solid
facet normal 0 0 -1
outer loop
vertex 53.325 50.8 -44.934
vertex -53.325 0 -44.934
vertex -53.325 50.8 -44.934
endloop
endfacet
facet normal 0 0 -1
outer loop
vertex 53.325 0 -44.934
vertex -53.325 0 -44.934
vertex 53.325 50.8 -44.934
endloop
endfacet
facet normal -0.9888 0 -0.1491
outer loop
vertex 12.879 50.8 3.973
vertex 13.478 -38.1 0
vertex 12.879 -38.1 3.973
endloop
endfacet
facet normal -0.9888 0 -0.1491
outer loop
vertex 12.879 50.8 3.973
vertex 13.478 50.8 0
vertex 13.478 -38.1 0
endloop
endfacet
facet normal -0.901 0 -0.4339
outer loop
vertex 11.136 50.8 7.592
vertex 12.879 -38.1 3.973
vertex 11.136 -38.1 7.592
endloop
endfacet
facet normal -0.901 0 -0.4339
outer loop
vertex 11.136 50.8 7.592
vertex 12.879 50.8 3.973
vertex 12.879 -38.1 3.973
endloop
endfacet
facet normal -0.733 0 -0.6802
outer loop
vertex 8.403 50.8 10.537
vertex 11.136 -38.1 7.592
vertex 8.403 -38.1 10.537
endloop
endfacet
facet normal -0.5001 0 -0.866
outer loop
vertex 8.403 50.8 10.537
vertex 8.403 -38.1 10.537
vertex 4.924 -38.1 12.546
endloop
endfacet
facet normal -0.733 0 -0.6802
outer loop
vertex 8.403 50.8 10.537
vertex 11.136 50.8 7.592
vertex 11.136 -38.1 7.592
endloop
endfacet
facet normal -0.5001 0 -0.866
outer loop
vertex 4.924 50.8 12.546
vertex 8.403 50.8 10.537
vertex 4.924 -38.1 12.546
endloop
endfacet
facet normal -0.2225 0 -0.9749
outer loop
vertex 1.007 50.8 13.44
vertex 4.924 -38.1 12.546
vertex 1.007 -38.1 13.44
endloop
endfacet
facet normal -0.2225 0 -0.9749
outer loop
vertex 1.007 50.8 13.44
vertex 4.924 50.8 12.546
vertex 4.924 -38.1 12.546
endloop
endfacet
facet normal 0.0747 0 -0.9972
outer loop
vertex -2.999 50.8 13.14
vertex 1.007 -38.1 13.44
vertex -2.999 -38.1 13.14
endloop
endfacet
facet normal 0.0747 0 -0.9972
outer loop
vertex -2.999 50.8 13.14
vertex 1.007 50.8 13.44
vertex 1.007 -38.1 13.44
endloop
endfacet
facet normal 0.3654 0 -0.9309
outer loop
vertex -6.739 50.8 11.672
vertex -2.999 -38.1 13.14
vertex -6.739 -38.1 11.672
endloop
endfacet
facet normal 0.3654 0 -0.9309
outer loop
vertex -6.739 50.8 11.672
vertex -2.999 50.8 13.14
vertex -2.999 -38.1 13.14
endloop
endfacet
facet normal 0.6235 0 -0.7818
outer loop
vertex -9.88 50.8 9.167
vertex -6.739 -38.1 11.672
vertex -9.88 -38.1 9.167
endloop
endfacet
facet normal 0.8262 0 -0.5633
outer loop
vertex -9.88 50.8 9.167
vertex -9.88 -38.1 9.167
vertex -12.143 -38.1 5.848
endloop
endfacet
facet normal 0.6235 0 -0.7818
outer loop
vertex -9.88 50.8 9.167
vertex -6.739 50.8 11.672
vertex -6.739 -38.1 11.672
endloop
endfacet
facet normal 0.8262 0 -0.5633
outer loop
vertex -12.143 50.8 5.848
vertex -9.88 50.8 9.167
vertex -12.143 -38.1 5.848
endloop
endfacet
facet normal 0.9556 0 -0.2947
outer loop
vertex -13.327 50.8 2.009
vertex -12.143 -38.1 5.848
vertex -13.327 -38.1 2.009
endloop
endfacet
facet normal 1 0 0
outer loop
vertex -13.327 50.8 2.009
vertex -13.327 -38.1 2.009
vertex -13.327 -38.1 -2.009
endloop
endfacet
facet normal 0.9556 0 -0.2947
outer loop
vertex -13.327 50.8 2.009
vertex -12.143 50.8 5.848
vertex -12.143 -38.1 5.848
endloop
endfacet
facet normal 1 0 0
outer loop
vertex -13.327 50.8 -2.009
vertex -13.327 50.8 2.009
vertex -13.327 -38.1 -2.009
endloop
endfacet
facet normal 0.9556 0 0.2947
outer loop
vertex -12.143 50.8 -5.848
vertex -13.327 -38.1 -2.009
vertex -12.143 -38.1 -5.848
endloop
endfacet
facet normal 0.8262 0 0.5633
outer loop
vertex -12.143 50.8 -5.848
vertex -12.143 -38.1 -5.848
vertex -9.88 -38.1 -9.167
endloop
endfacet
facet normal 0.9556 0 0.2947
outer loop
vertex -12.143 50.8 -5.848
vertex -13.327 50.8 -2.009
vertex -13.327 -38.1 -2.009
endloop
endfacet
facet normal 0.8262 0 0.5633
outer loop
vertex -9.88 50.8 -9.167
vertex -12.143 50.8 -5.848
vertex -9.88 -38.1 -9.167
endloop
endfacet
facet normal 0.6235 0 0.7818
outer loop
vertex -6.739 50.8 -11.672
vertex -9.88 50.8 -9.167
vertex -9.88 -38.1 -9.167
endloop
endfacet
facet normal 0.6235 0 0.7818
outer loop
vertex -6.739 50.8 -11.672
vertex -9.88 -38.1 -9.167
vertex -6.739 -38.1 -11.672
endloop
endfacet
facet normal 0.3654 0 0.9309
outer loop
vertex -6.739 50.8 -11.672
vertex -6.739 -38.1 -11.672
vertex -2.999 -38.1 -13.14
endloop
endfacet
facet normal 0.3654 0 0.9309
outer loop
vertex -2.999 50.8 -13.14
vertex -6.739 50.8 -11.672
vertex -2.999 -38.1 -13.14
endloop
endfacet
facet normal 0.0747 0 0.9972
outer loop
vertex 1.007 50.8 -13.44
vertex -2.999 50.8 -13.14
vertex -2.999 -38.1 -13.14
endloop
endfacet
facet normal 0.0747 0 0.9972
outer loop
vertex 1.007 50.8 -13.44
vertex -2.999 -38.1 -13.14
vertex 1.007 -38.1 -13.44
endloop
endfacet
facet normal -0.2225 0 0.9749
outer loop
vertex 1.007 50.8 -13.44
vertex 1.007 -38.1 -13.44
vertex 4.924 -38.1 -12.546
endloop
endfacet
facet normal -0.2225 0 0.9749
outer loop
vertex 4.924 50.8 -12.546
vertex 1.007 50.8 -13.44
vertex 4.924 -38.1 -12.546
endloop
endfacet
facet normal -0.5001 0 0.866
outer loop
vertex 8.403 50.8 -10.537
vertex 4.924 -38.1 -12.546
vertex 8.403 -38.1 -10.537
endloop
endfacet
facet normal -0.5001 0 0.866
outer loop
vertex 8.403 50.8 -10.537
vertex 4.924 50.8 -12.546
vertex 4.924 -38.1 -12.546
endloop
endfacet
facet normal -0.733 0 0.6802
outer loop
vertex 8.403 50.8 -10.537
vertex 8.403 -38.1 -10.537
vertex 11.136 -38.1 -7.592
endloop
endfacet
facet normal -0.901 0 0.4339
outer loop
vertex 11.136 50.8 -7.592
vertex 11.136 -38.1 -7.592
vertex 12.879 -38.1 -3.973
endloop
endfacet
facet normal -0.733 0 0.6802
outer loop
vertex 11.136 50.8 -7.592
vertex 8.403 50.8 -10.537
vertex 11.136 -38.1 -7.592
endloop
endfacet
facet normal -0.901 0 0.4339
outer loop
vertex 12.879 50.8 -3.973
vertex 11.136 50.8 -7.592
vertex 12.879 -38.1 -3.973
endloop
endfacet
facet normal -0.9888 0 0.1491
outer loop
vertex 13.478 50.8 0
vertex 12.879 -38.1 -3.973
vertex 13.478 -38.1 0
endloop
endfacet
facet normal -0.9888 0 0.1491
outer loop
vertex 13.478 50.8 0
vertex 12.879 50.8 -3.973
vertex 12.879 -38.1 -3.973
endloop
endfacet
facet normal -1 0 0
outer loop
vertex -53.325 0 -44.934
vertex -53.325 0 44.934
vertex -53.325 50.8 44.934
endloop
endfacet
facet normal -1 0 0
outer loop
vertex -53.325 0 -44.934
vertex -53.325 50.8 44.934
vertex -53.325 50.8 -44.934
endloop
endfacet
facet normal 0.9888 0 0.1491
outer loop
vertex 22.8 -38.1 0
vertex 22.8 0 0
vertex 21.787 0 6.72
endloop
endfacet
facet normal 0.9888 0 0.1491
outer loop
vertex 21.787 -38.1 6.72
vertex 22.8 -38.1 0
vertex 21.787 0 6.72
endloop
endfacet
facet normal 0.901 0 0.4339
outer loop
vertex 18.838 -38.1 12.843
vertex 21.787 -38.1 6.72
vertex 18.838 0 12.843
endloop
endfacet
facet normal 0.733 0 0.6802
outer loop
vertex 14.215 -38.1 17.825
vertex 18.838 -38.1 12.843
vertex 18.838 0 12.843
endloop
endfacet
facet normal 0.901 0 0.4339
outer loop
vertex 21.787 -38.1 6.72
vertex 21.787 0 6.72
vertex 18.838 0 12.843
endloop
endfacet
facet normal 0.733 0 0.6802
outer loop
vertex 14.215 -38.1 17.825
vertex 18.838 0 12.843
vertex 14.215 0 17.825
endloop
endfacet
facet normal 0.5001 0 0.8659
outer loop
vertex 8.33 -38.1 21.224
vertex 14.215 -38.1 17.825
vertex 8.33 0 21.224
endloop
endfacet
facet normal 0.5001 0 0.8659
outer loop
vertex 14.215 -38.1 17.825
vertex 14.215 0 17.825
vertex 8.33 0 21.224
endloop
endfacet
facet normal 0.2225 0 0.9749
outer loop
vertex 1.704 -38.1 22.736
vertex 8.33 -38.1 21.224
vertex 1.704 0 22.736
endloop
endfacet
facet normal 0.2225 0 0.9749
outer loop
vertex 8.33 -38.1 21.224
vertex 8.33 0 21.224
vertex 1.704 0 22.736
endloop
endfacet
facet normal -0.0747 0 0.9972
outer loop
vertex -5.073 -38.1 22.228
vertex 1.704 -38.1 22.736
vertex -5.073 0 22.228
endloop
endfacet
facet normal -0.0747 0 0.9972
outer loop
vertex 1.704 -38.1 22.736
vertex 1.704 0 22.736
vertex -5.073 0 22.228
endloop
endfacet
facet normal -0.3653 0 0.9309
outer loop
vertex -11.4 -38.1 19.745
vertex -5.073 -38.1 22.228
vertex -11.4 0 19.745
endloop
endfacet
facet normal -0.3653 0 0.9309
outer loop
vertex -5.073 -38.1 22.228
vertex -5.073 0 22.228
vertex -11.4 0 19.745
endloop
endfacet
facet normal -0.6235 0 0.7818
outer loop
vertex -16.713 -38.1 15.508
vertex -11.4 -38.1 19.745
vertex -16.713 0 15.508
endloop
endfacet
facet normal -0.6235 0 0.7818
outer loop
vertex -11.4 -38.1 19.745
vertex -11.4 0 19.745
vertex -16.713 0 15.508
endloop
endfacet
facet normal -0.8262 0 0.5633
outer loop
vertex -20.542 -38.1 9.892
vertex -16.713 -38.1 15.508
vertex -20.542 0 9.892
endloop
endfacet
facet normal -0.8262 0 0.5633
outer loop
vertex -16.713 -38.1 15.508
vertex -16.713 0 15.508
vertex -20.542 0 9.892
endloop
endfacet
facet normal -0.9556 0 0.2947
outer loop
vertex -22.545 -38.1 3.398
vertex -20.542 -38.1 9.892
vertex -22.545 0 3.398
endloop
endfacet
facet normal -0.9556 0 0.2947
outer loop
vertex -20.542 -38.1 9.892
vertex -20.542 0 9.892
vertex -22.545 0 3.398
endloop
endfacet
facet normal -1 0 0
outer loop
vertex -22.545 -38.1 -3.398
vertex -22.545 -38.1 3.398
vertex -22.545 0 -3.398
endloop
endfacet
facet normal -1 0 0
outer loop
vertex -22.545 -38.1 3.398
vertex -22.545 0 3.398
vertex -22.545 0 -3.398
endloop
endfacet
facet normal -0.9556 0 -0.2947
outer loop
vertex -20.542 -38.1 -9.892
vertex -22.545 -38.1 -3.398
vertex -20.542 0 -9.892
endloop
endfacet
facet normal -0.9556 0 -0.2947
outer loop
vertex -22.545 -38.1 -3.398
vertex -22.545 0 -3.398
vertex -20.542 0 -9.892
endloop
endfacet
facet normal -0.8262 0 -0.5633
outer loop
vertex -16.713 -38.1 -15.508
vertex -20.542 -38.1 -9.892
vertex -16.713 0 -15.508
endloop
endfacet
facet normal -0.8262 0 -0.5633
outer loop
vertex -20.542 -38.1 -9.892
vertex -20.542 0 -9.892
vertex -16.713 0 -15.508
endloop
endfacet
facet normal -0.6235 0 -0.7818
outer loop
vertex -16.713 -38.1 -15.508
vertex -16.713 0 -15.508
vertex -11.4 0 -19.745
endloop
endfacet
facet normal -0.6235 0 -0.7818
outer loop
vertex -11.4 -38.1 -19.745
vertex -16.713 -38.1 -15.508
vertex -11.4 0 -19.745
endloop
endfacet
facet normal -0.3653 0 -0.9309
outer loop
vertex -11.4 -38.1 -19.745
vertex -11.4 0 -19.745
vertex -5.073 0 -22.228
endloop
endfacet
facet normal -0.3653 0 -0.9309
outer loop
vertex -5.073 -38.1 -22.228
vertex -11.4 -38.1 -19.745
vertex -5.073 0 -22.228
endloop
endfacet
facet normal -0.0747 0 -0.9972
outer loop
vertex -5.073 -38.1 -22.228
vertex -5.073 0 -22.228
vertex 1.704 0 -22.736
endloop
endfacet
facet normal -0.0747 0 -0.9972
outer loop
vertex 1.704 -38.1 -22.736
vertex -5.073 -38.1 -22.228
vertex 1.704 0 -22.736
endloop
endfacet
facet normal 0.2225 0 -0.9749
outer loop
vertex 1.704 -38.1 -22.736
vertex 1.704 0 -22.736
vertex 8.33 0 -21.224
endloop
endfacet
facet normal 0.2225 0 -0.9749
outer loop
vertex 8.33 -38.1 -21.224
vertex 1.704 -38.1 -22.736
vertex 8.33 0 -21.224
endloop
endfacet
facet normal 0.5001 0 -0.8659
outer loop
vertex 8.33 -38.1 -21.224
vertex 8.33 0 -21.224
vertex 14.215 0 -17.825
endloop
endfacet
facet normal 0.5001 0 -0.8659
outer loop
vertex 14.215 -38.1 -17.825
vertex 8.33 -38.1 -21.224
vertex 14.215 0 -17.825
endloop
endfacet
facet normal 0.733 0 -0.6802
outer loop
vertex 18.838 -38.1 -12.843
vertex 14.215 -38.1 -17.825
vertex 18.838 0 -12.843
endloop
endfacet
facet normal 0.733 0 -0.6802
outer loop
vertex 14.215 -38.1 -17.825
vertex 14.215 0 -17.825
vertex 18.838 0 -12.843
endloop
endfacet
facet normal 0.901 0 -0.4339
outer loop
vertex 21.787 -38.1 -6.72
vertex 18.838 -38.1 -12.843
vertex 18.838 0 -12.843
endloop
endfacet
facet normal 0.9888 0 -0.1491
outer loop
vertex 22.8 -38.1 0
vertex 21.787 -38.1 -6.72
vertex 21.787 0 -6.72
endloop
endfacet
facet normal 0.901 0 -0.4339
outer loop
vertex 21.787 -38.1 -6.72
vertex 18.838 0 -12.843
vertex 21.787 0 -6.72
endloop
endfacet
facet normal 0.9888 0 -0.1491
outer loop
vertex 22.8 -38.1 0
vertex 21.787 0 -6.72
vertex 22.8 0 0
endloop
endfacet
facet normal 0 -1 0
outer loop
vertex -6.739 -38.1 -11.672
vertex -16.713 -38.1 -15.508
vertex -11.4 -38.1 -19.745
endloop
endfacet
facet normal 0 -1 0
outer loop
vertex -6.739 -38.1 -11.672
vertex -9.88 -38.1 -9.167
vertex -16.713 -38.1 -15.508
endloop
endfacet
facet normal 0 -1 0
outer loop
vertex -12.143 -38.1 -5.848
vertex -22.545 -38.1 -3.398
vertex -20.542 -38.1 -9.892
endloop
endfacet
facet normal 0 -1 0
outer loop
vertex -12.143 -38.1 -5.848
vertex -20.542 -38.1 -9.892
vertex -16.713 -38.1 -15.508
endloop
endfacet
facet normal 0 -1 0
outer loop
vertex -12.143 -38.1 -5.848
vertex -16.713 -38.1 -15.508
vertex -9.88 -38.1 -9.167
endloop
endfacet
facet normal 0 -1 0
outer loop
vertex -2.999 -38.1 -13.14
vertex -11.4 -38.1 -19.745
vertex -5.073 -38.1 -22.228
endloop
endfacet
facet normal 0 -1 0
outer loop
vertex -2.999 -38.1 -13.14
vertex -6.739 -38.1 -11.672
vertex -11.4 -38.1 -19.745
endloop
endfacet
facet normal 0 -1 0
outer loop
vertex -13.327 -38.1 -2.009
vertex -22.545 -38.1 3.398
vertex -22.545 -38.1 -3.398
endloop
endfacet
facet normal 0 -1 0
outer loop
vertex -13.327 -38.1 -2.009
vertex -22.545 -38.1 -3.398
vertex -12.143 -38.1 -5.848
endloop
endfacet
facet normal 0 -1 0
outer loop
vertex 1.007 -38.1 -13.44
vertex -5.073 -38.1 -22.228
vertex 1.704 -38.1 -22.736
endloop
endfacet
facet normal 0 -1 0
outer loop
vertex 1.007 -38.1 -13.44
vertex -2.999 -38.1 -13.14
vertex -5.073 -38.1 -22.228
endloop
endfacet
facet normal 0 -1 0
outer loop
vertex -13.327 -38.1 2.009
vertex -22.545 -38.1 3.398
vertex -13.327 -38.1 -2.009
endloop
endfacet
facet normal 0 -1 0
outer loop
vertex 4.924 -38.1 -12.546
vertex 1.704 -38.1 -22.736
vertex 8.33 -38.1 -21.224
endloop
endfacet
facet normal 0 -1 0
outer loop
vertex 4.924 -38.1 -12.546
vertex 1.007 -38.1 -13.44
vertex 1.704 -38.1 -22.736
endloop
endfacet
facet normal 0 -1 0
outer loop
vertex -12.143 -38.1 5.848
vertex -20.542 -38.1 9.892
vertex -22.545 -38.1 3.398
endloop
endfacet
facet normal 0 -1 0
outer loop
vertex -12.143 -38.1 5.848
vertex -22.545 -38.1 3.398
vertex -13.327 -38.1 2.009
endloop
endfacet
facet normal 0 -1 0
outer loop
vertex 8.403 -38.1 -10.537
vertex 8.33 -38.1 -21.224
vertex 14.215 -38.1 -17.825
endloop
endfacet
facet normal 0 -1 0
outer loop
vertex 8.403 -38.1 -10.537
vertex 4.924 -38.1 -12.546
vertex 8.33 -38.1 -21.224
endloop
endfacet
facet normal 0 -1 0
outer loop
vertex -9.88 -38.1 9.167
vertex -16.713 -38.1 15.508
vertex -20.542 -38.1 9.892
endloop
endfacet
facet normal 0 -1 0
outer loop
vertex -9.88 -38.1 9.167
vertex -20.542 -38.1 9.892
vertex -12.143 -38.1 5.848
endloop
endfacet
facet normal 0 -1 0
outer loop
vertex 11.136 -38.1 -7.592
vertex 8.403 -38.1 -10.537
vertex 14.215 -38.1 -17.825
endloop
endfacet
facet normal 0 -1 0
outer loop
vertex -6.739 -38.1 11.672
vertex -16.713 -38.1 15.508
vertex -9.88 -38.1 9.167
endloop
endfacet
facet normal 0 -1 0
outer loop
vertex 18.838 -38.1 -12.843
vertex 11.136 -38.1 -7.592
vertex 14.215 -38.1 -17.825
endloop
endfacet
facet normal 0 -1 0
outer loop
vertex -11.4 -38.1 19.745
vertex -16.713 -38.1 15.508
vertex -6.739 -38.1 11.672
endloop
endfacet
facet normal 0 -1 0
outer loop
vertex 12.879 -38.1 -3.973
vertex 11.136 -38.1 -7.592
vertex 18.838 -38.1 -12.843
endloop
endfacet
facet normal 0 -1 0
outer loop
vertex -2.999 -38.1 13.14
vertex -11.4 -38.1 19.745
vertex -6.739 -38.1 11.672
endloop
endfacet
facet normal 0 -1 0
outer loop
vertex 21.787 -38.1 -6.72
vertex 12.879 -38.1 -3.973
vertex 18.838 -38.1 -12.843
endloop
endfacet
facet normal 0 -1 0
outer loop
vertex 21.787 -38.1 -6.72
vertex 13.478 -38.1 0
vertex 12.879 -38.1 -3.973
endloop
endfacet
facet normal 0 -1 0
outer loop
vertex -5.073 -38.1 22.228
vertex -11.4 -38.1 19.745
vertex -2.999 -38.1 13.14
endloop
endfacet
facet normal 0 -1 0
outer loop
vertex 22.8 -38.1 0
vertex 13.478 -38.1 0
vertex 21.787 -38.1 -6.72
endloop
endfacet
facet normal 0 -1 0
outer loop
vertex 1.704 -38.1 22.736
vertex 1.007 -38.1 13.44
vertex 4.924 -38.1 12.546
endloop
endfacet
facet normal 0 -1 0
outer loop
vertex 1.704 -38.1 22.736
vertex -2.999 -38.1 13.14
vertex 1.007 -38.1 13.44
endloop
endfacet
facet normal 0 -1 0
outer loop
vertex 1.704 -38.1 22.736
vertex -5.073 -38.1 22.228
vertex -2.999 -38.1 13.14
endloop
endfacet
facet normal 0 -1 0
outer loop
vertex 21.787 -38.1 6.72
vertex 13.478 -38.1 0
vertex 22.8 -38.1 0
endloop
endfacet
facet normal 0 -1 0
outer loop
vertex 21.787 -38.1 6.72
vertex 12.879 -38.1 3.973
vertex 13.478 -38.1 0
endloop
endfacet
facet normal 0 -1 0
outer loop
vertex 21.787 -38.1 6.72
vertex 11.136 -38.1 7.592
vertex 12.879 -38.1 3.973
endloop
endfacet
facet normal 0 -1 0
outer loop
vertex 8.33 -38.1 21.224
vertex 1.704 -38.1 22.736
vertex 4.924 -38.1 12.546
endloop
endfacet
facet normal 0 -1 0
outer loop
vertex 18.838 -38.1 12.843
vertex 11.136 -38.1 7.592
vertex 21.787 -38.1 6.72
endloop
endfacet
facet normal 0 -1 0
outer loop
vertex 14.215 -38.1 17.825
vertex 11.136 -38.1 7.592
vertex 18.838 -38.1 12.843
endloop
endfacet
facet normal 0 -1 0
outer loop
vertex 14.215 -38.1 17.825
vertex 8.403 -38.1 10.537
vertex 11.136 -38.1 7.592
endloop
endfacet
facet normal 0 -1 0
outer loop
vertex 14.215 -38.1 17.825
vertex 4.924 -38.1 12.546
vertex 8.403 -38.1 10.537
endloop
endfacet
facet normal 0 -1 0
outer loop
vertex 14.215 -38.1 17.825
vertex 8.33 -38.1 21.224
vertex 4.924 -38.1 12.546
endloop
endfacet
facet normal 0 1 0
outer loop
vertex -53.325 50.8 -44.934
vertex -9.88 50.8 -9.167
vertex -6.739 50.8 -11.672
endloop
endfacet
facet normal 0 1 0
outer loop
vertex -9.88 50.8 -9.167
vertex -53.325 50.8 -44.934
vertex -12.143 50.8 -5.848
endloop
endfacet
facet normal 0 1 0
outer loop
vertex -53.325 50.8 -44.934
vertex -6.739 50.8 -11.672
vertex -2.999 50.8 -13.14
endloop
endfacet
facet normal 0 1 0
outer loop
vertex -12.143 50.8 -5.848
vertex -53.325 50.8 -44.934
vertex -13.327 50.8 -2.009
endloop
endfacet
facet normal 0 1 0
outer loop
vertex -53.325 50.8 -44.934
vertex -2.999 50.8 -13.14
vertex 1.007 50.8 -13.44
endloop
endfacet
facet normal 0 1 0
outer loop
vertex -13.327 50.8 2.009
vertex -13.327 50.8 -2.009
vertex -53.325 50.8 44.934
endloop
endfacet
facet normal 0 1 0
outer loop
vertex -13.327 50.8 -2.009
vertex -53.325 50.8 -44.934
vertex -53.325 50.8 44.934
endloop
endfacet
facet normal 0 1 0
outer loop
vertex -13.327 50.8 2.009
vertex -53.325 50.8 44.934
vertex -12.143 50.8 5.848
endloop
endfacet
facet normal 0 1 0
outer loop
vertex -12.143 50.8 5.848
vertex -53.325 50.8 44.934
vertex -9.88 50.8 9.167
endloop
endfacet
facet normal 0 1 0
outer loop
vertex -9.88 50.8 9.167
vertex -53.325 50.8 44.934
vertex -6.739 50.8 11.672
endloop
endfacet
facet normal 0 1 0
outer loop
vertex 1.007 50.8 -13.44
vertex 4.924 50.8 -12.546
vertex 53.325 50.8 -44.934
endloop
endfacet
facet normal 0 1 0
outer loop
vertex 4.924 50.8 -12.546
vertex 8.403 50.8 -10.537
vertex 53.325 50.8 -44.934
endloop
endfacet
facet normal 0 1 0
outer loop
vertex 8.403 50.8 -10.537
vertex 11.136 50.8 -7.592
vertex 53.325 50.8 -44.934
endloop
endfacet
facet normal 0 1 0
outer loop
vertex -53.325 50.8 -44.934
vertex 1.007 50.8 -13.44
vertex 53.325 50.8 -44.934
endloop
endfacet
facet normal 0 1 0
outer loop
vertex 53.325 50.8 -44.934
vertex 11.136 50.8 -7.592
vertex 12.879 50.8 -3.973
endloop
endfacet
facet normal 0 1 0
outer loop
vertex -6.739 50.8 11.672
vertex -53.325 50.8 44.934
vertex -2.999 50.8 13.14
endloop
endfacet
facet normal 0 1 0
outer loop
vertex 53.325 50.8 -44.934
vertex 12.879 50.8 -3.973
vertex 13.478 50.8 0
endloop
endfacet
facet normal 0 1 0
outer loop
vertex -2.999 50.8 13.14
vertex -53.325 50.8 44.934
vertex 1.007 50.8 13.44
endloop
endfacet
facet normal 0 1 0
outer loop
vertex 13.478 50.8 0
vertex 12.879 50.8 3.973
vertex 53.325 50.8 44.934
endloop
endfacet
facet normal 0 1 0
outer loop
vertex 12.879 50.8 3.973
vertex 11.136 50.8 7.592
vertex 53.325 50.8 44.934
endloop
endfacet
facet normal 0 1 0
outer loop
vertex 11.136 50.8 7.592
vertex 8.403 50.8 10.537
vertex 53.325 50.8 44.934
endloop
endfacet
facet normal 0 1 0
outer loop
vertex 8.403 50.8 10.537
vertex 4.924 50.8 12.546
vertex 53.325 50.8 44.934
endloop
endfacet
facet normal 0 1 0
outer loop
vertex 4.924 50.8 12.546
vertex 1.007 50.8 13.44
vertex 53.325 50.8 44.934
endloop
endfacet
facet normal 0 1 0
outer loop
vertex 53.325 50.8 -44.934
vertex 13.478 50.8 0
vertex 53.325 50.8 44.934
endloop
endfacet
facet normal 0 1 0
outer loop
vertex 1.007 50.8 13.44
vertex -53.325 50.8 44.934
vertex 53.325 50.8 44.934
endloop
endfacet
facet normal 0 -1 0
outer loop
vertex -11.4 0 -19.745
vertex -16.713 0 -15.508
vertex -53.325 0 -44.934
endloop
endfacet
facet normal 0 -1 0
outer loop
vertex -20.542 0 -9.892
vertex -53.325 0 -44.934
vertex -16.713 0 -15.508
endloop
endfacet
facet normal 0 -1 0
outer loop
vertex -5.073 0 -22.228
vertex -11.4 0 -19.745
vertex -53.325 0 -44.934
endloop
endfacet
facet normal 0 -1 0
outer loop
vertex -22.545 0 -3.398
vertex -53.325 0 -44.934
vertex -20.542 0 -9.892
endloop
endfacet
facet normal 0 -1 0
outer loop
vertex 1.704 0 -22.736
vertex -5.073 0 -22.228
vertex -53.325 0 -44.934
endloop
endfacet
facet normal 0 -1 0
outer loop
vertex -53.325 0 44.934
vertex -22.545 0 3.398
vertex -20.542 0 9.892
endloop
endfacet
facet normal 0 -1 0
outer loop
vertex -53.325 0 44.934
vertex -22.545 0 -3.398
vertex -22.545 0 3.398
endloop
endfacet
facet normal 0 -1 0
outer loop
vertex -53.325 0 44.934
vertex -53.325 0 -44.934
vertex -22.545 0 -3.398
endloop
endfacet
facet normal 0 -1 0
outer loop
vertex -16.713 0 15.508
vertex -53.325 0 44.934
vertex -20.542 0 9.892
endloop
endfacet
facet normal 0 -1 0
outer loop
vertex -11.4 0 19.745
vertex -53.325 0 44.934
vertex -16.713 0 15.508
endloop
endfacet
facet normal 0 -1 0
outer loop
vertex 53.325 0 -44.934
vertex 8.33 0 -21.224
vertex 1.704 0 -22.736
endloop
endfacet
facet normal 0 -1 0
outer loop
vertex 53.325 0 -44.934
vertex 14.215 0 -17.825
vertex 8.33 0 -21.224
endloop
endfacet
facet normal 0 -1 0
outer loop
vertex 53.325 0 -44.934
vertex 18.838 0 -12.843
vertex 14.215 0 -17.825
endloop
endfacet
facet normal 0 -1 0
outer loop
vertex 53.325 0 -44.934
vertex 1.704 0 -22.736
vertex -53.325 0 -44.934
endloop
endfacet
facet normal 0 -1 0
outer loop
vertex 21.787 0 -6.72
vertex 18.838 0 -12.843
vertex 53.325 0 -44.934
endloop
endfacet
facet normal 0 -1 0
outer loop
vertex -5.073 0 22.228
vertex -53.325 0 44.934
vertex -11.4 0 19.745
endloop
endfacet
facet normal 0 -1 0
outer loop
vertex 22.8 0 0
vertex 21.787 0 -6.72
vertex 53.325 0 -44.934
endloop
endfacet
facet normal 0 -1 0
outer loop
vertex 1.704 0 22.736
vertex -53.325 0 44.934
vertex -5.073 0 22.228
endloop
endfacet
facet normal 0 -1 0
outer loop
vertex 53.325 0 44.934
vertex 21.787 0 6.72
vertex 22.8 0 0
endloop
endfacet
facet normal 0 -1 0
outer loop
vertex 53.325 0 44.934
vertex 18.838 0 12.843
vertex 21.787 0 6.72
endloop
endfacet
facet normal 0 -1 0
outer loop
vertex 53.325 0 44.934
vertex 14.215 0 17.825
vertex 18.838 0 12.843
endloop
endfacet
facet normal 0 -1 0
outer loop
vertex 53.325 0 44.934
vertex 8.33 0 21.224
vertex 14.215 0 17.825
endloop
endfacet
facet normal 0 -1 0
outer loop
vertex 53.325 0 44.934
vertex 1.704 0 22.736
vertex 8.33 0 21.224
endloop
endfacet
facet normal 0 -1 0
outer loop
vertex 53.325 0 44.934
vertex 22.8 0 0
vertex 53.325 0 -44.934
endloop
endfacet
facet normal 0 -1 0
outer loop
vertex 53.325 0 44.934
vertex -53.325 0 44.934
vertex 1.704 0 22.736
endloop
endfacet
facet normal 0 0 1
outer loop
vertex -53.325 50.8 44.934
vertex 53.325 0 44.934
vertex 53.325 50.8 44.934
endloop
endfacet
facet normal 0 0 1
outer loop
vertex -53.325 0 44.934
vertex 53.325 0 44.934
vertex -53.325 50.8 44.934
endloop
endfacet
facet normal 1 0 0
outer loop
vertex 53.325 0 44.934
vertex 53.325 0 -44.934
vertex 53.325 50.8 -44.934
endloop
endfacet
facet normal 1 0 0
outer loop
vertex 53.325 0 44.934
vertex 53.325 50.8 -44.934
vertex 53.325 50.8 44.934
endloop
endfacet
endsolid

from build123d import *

# Parameters (mm, degrees)
F0_R     = 22.799562
F0_R_2   = 13.477557
F1_DEPTH = 50.8
F2_DEPTH = 38.1


with BuildPart() as f1:
    # F0 (on Front) → F1 (new body)
    with BuildSketch(Plane.XZ):
        Polygon((53.325333, 44.9339), (0, 44.9339), (-53.325333, 44.9339), (-53.325333, 0), (-53.325333, -44.9339), (0, -44.9339), (53.325333, -44.9339), (53.325333, 0), align=None)
        Circle(F0_R, mode=Mode.SUBTRACT)
        Circle(F0_R)
        Circle(F0_R_2, mode=Mode.SUBTRACT)
    extrude(amount=-F1_DEPTH)

    # F0 (on Front) → F2 (join)
    with BuildSketch(Plane.XZ):
        Circle(F0_R)
        Circle(F0_R_2, mode=Mode.SUBTRACT)
    extrude(amount=F2_DEPTH)


solid = f1.part
